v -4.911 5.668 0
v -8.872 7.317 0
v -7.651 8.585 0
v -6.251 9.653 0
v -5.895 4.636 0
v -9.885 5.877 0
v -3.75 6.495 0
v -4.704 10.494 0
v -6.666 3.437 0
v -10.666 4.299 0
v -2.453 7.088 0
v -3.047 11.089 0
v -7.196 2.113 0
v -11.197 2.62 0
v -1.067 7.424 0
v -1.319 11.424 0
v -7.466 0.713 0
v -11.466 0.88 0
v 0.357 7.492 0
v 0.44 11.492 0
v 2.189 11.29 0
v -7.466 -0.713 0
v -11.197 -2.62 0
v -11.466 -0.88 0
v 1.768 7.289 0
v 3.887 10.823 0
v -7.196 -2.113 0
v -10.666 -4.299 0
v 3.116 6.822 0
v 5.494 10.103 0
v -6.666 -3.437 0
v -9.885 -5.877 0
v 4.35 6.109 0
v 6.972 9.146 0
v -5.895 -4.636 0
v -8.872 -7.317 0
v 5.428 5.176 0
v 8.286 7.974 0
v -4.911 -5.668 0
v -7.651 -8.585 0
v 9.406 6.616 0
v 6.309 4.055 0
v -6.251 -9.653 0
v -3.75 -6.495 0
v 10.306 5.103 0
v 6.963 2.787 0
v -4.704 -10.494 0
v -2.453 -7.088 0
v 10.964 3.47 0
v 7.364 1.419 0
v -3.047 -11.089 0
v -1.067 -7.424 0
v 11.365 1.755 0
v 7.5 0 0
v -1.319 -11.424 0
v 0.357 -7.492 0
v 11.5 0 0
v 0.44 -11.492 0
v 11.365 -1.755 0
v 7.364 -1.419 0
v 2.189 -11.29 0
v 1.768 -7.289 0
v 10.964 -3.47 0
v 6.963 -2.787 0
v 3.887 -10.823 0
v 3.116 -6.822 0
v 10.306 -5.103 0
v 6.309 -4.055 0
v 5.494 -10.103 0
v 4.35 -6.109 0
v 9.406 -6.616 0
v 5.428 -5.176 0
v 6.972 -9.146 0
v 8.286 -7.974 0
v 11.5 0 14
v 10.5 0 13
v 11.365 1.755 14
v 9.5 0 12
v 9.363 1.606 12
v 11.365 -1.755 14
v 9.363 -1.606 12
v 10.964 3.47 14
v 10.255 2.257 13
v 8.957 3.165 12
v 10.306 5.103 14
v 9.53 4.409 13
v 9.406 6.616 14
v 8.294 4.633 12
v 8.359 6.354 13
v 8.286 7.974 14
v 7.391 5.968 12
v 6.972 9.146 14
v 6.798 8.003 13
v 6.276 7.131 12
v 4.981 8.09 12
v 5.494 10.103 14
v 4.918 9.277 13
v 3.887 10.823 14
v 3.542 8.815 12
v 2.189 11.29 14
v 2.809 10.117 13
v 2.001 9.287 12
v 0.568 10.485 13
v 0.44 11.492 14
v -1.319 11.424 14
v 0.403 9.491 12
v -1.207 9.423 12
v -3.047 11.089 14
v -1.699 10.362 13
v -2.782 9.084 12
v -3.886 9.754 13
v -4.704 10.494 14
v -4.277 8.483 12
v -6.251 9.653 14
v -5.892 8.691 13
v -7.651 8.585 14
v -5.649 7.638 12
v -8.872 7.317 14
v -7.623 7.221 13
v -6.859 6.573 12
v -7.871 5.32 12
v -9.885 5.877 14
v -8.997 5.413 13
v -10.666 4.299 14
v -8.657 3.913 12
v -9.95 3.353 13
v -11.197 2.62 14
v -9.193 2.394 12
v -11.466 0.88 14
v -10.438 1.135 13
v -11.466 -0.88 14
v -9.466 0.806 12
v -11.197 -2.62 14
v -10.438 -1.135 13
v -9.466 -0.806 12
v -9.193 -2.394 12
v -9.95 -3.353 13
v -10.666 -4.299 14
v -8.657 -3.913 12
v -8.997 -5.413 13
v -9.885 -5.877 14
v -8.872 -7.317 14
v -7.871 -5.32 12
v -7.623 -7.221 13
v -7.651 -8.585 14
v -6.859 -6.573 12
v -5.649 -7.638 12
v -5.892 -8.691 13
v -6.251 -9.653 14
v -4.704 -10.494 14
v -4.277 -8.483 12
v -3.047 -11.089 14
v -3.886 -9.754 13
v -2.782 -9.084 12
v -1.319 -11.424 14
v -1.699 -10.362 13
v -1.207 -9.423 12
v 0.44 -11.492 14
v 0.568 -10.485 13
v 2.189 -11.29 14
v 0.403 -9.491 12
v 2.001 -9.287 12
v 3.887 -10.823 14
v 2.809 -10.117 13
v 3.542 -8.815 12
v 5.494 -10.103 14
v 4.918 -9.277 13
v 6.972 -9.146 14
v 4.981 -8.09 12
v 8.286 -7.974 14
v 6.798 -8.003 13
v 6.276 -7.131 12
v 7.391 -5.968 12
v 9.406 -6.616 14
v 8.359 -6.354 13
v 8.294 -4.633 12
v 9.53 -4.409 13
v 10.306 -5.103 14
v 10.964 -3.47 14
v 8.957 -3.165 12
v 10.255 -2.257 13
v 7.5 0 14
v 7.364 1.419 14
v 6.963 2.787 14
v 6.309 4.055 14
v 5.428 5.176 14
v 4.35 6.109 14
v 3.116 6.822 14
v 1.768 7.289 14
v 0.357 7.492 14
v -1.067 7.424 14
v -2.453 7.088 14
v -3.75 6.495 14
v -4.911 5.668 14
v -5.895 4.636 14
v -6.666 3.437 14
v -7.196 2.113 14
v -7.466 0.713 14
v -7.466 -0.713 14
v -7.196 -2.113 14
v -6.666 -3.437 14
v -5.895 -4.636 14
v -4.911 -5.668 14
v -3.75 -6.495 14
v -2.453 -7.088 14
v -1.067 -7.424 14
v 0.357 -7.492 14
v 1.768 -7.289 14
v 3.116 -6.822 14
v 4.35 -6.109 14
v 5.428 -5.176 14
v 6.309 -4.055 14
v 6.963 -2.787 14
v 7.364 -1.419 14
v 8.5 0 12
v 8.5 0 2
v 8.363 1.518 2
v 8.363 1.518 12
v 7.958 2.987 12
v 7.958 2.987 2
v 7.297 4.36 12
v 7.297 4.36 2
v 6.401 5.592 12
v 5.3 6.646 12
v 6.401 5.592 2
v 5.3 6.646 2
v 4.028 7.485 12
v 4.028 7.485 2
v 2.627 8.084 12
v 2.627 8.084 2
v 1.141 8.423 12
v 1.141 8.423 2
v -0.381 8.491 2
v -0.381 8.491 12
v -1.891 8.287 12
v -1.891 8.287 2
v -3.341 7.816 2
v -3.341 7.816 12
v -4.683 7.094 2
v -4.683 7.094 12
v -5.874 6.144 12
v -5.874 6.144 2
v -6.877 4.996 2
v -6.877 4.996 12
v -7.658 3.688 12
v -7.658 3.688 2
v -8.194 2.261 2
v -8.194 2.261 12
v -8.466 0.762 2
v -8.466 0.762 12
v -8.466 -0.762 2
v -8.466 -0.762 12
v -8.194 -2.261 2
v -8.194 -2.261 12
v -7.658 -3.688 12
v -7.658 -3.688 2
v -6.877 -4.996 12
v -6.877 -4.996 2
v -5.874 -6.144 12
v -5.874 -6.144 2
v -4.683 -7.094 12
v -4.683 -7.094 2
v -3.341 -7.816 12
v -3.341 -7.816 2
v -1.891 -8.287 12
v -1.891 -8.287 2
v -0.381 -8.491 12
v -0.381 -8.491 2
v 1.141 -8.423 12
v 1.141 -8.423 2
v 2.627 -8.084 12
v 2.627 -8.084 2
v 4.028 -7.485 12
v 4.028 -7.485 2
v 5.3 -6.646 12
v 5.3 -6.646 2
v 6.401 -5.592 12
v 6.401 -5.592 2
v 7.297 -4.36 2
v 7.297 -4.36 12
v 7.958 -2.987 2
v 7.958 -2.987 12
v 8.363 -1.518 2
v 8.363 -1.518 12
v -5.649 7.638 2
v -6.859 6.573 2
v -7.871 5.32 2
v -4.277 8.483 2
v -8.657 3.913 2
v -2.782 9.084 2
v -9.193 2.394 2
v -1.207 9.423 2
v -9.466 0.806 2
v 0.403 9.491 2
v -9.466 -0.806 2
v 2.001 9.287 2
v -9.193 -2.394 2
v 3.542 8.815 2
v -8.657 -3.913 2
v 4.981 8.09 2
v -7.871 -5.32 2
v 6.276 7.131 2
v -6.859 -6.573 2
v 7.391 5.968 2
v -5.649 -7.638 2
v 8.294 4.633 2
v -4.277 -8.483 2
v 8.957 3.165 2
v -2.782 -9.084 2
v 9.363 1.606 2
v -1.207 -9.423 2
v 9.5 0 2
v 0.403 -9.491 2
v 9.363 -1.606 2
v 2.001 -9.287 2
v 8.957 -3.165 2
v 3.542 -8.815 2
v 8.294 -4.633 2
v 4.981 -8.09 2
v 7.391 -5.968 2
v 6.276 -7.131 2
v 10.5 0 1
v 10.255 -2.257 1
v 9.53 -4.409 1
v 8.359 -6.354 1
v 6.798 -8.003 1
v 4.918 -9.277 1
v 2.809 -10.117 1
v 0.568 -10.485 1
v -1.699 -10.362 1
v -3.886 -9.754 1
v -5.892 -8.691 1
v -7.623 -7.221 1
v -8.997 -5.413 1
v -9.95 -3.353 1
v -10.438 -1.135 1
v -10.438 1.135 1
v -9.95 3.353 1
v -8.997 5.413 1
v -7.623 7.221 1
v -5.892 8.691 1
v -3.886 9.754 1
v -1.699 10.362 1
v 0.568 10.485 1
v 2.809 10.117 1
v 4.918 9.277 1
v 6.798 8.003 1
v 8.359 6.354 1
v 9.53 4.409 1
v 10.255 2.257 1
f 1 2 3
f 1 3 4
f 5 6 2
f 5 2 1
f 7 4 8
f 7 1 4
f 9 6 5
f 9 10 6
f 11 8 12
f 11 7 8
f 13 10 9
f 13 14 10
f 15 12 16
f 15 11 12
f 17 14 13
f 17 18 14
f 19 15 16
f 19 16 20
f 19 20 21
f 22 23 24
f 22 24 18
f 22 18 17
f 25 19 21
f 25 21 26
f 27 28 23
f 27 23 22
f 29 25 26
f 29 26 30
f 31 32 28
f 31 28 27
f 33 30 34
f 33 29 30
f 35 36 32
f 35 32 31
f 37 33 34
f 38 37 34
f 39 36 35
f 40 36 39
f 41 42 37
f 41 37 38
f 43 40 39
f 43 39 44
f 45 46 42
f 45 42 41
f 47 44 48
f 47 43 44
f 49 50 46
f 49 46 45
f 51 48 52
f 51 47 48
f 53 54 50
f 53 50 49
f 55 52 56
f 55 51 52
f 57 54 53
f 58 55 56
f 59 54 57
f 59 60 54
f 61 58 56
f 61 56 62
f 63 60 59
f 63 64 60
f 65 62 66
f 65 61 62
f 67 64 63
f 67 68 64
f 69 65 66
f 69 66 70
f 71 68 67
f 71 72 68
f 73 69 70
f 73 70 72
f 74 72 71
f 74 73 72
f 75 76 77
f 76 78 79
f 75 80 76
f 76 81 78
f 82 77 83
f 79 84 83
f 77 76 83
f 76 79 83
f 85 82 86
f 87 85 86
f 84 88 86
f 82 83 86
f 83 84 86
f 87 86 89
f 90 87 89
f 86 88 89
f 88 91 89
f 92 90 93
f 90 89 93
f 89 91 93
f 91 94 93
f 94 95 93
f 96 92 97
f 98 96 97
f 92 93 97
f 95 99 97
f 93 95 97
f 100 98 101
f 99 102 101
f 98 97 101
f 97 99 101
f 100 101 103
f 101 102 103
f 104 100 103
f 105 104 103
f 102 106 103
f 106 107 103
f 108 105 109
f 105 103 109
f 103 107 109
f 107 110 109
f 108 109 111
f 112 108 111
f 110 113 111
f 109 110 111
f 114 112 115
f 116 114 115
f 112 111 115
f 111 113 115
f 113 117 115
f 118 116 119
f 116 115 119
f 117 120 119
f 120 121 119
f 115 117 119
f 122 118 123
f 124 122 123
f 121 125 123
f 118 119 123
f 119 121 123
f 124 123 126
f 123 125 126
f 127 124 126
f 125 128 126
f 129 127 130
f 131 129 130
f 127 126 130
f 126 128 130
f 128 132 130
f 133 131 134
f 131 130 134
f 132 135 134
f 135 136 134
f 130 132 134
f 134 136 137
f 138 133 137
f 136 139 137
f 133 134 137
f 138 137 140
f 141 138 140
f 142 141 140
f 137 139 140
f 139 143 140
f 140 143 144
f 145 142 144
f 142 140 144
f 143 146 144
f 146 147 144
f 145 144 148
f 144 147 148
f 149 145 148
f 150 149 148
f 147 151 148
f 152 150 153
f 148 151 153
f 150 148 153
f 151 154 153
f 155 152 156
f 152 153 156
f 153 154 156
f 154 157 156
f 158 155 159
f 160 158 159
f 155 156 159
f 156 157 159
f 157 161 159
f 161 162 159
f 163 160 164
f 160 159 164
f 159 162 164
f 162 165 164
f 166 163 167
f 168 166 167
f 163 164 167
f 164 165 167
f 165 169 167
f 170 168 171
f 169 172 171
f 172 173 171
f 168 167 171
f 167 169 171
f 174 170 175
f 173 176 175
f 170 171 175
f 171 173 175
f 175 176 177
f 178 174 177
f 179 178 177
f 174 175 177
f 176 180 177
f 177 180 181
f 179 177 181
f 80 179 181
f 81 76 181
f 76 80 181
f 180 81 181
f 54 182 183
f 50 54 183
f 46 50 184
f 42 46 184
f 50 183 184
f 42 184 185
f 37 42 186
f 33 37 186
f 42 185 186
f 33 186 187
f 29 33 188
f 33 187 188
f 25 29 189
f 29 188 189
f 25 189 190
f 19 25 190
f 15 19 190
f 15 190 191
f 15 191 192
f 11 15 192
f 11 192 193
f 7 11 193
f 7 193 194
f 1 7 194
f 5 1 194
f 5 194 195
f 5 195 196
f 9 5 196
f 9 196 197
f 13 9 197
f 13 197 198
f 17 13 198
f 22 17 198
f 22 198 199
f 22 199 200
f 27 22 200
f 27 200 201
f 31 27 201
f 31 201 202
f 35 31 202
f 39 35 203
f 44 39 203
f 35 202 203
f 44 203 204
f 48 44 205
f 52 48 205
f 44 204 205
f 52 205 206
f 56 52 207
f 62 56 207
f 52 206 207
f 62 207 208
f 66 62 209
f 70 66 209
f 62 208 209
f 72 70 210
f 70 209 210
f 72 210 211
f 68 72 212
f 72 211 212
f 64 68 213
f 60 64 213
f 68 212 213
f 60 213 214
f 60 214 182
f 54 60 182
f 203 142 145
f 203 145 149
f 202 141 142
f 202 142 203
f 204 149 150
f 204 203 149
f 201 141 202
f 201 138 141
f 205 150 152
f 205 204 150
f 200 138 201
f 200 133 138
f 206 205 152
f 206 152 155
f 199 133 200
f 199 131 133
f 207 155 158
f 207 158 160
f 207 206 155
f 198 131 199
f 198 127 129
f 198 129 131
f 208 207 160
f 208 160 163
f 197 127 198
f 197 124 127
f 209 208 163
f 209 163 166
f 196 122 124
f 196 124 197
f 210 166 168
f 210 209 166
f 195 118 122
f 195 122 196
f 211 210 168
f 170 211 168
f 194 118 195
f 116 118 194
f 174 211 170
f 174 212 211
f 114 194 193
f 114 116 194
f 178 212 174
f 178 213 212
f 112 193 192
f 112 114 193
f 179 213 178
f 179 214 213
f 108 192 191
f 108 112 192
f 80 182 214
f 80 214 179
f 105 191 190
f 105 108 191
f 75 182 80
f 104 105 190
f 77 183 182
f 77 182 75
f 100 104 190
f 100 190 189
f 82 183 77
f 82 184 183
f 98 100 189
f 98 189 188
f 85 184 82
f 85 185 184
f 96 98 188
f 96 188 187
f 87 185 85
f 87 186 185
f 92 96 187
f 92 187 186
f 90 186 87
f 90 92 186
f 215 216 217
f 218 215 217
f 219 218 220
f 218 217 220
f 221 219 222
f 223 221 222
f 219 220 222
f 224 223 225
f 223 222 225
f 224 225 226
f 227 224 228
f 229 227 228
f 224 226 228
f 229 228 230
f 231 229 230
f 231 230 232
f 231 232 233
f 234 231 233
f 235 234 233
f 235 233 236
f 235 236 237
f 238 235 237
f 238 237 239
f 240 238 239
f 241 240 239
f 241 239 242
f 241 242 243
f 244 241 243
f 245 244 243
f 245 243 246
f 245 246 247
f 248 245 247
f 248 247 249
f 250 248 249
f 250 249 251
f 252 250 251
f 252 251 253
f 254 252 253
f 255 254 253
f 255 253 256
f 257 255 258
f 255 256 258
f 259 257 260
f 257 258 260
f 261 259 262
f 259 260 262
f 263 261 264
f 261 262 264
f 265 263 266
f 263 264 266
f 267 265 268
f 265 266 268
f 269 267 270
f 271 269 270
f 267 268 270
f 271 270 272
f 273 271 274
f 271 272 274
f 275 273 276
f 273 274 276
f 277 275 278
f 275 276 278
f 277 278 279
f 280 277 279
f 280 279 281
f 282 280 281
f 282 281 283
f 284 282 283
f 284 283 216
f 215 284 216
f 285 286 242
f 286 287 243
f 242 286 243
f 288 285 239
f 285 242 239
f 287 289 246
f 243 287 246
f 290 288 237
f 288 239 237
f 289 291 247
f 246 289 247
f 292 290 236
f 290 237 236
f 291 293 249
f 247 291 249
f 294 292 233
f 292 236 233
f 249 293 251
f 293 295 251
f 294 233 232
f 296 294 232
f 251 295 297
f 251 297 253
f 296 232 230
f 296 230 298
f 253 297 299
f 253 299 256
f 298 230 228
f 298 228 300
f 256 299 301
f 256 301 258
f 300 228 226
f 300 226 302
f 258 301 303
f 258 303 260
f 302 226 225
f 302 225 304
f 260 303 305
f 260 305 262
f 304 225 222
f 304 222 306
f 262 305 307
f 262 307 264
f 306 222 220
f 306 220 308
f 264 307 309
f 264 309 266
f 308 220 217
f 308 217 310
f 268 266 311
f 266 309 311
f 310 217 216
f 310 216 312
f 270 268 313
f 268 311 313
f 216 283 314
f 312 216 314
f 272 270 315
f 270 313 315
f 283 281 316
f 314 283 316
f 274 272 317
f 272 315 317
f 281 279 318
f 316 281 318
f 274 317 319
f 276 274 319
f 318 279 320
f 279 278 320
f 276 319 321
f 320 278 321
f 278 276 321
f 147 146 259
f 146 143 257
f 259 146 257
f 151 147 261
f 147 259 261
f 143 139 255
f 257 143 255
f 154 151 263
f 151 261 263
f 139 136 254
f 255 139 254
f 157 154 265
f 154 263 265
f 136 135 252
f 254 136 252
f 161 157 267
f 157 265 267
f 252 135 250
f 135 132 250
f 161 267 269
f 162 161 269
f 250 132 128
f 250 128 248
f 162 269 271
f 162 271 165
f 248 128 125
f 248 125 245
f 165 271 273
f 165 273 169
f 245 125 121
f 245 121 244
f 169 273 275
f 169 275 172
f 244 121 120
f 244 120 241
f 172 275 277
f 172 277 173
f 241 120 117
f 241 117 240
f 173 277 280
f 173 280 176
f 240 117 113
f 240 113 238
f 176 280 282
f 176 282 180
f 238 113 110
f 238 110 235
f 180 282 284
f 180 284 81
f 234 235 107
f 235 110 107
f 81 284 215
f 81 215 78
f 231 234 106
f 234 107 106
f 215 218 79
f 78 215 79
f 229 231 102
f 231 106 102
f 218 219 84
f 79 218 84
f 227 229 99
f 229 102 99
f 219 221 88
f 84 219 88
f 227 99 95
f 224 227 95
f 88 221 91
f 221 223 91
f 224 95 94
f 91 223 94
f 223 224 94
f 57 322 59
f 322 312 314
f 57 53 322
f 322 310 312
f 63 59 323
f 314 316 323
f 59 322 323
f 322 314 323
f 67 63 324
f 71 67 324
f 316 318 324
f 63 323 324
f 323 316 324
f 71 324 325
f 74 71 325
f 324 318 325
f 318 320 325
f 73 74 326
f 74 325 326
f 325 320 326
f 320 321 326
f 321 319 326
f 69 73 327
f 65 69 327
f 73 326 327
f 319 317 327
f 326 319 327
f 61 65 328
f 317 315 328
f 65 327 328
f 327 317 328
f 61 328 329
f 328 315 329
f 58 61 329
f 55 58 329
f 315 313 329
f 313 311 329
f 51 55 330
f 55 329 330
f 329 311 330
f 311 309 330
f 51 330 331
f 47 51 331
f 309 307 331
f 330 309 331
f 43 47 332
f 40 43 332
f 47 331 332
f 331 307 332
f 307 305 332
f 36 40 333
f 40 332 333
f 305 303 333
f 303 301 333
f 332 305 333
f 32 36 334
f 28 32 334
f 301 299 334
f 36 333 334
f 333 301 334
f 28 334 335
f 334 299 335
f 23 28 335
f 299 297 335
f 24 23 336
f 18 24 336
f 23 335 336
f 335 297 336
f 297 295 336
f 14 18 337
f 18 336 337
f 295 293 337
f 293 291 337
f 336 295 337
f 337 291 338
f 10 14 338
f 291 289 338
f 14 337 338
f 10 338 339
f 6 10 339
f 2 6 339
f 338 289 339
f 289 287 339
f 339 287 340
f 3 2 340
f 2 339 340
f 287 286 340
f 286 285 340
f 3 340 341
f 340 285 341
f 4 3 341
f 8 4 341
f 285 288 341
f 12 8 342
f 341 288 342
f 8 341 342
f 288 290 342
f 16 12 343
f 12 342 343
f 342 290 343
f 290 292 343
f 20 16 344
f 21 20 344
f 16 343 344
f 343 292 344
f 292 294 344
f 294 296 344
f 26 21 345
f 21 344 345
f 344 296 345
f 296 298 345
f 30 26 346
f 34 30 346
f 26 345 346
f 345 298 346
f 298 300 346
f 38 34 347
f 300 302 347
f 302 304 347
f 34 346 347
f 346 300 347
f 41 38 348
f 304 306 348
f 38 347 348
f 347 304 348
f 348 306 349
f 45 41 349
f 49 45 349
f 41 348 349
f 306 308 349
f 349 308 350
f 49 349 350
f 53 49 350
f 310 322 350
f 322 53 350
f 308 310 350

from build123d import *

# Parameters (mm, degrees)
F0_R     = 8.5
F1_DEPTH = 14
F2_R     = 11.5
F2_R_2   = 8.5
F4_DEPTH = 2
F5_SIZE  = 1.99999
F3_R     = 11.5
F3_R_2   = 8.5
F6_DEPTH = 2
F7_SIZE  = 1.99999
F8_R     = 7.5
F9_DEPTH = 14.001


# Not quite as in the source:
# - a fillet or chamfer is up to 0.001 mm smaller than in the source, because OpenCascade refuses the exact size


with BuildPart() as f1:
    # F0 (on Top) → F1 (new body)
    with BuildSketch(Plane.XY):
        Circle(F0_R)
    extrude(amount=F1_DEPTH)

    # F2 (on face) → F4 (join)
    with BuildSketch(Plane.XY.offset(14)):
        Circle(F2_R)
        Circle(F2_R_2, mode=Mode.SUBTRACT)
    extrude(amount=-F4_DEPTH)

    # F5 (size 2 in the source; OpenCascade refuses exactly that, so slightly less here)
    f5_edges = [f1.edges().sort_by_distance(p)[0] for p in [
        (-11.5, 0, 12),
    ]]
    chamfer(f5_edges, length=F5_SIZE)

    # F3 (on face) → F6 (join)
    with BuildSketch(Plane(origin=(0, 0, 0), x_dir=(1, 0, 0), z_dir=(0, 0, -1))):
        Circle(F3_R)
        Circle(F3_R_2, mode=Mode.SUBTRACT)
    extrude(amount=-F6_DEPTH)

    # F7 (size 2 in the source; OpenCascade refuses exactly that, so slightly less here)
    f7_edges = [f1.edges().sort_by_distance(p)[0] for p in [
        (-11.5, 0, 2),
    ]]
    chamfer(f7_edges, length=F7_SIZE)

    # F8 (on face) → F9 (cut, through all)
    with BuildSketch(Plane.XY.offset(14)):
        Circle(F8_R)
    extrude(amount=-F9_DEPTH, mode=Mode.SUBTRACT)


solid = f1.part
